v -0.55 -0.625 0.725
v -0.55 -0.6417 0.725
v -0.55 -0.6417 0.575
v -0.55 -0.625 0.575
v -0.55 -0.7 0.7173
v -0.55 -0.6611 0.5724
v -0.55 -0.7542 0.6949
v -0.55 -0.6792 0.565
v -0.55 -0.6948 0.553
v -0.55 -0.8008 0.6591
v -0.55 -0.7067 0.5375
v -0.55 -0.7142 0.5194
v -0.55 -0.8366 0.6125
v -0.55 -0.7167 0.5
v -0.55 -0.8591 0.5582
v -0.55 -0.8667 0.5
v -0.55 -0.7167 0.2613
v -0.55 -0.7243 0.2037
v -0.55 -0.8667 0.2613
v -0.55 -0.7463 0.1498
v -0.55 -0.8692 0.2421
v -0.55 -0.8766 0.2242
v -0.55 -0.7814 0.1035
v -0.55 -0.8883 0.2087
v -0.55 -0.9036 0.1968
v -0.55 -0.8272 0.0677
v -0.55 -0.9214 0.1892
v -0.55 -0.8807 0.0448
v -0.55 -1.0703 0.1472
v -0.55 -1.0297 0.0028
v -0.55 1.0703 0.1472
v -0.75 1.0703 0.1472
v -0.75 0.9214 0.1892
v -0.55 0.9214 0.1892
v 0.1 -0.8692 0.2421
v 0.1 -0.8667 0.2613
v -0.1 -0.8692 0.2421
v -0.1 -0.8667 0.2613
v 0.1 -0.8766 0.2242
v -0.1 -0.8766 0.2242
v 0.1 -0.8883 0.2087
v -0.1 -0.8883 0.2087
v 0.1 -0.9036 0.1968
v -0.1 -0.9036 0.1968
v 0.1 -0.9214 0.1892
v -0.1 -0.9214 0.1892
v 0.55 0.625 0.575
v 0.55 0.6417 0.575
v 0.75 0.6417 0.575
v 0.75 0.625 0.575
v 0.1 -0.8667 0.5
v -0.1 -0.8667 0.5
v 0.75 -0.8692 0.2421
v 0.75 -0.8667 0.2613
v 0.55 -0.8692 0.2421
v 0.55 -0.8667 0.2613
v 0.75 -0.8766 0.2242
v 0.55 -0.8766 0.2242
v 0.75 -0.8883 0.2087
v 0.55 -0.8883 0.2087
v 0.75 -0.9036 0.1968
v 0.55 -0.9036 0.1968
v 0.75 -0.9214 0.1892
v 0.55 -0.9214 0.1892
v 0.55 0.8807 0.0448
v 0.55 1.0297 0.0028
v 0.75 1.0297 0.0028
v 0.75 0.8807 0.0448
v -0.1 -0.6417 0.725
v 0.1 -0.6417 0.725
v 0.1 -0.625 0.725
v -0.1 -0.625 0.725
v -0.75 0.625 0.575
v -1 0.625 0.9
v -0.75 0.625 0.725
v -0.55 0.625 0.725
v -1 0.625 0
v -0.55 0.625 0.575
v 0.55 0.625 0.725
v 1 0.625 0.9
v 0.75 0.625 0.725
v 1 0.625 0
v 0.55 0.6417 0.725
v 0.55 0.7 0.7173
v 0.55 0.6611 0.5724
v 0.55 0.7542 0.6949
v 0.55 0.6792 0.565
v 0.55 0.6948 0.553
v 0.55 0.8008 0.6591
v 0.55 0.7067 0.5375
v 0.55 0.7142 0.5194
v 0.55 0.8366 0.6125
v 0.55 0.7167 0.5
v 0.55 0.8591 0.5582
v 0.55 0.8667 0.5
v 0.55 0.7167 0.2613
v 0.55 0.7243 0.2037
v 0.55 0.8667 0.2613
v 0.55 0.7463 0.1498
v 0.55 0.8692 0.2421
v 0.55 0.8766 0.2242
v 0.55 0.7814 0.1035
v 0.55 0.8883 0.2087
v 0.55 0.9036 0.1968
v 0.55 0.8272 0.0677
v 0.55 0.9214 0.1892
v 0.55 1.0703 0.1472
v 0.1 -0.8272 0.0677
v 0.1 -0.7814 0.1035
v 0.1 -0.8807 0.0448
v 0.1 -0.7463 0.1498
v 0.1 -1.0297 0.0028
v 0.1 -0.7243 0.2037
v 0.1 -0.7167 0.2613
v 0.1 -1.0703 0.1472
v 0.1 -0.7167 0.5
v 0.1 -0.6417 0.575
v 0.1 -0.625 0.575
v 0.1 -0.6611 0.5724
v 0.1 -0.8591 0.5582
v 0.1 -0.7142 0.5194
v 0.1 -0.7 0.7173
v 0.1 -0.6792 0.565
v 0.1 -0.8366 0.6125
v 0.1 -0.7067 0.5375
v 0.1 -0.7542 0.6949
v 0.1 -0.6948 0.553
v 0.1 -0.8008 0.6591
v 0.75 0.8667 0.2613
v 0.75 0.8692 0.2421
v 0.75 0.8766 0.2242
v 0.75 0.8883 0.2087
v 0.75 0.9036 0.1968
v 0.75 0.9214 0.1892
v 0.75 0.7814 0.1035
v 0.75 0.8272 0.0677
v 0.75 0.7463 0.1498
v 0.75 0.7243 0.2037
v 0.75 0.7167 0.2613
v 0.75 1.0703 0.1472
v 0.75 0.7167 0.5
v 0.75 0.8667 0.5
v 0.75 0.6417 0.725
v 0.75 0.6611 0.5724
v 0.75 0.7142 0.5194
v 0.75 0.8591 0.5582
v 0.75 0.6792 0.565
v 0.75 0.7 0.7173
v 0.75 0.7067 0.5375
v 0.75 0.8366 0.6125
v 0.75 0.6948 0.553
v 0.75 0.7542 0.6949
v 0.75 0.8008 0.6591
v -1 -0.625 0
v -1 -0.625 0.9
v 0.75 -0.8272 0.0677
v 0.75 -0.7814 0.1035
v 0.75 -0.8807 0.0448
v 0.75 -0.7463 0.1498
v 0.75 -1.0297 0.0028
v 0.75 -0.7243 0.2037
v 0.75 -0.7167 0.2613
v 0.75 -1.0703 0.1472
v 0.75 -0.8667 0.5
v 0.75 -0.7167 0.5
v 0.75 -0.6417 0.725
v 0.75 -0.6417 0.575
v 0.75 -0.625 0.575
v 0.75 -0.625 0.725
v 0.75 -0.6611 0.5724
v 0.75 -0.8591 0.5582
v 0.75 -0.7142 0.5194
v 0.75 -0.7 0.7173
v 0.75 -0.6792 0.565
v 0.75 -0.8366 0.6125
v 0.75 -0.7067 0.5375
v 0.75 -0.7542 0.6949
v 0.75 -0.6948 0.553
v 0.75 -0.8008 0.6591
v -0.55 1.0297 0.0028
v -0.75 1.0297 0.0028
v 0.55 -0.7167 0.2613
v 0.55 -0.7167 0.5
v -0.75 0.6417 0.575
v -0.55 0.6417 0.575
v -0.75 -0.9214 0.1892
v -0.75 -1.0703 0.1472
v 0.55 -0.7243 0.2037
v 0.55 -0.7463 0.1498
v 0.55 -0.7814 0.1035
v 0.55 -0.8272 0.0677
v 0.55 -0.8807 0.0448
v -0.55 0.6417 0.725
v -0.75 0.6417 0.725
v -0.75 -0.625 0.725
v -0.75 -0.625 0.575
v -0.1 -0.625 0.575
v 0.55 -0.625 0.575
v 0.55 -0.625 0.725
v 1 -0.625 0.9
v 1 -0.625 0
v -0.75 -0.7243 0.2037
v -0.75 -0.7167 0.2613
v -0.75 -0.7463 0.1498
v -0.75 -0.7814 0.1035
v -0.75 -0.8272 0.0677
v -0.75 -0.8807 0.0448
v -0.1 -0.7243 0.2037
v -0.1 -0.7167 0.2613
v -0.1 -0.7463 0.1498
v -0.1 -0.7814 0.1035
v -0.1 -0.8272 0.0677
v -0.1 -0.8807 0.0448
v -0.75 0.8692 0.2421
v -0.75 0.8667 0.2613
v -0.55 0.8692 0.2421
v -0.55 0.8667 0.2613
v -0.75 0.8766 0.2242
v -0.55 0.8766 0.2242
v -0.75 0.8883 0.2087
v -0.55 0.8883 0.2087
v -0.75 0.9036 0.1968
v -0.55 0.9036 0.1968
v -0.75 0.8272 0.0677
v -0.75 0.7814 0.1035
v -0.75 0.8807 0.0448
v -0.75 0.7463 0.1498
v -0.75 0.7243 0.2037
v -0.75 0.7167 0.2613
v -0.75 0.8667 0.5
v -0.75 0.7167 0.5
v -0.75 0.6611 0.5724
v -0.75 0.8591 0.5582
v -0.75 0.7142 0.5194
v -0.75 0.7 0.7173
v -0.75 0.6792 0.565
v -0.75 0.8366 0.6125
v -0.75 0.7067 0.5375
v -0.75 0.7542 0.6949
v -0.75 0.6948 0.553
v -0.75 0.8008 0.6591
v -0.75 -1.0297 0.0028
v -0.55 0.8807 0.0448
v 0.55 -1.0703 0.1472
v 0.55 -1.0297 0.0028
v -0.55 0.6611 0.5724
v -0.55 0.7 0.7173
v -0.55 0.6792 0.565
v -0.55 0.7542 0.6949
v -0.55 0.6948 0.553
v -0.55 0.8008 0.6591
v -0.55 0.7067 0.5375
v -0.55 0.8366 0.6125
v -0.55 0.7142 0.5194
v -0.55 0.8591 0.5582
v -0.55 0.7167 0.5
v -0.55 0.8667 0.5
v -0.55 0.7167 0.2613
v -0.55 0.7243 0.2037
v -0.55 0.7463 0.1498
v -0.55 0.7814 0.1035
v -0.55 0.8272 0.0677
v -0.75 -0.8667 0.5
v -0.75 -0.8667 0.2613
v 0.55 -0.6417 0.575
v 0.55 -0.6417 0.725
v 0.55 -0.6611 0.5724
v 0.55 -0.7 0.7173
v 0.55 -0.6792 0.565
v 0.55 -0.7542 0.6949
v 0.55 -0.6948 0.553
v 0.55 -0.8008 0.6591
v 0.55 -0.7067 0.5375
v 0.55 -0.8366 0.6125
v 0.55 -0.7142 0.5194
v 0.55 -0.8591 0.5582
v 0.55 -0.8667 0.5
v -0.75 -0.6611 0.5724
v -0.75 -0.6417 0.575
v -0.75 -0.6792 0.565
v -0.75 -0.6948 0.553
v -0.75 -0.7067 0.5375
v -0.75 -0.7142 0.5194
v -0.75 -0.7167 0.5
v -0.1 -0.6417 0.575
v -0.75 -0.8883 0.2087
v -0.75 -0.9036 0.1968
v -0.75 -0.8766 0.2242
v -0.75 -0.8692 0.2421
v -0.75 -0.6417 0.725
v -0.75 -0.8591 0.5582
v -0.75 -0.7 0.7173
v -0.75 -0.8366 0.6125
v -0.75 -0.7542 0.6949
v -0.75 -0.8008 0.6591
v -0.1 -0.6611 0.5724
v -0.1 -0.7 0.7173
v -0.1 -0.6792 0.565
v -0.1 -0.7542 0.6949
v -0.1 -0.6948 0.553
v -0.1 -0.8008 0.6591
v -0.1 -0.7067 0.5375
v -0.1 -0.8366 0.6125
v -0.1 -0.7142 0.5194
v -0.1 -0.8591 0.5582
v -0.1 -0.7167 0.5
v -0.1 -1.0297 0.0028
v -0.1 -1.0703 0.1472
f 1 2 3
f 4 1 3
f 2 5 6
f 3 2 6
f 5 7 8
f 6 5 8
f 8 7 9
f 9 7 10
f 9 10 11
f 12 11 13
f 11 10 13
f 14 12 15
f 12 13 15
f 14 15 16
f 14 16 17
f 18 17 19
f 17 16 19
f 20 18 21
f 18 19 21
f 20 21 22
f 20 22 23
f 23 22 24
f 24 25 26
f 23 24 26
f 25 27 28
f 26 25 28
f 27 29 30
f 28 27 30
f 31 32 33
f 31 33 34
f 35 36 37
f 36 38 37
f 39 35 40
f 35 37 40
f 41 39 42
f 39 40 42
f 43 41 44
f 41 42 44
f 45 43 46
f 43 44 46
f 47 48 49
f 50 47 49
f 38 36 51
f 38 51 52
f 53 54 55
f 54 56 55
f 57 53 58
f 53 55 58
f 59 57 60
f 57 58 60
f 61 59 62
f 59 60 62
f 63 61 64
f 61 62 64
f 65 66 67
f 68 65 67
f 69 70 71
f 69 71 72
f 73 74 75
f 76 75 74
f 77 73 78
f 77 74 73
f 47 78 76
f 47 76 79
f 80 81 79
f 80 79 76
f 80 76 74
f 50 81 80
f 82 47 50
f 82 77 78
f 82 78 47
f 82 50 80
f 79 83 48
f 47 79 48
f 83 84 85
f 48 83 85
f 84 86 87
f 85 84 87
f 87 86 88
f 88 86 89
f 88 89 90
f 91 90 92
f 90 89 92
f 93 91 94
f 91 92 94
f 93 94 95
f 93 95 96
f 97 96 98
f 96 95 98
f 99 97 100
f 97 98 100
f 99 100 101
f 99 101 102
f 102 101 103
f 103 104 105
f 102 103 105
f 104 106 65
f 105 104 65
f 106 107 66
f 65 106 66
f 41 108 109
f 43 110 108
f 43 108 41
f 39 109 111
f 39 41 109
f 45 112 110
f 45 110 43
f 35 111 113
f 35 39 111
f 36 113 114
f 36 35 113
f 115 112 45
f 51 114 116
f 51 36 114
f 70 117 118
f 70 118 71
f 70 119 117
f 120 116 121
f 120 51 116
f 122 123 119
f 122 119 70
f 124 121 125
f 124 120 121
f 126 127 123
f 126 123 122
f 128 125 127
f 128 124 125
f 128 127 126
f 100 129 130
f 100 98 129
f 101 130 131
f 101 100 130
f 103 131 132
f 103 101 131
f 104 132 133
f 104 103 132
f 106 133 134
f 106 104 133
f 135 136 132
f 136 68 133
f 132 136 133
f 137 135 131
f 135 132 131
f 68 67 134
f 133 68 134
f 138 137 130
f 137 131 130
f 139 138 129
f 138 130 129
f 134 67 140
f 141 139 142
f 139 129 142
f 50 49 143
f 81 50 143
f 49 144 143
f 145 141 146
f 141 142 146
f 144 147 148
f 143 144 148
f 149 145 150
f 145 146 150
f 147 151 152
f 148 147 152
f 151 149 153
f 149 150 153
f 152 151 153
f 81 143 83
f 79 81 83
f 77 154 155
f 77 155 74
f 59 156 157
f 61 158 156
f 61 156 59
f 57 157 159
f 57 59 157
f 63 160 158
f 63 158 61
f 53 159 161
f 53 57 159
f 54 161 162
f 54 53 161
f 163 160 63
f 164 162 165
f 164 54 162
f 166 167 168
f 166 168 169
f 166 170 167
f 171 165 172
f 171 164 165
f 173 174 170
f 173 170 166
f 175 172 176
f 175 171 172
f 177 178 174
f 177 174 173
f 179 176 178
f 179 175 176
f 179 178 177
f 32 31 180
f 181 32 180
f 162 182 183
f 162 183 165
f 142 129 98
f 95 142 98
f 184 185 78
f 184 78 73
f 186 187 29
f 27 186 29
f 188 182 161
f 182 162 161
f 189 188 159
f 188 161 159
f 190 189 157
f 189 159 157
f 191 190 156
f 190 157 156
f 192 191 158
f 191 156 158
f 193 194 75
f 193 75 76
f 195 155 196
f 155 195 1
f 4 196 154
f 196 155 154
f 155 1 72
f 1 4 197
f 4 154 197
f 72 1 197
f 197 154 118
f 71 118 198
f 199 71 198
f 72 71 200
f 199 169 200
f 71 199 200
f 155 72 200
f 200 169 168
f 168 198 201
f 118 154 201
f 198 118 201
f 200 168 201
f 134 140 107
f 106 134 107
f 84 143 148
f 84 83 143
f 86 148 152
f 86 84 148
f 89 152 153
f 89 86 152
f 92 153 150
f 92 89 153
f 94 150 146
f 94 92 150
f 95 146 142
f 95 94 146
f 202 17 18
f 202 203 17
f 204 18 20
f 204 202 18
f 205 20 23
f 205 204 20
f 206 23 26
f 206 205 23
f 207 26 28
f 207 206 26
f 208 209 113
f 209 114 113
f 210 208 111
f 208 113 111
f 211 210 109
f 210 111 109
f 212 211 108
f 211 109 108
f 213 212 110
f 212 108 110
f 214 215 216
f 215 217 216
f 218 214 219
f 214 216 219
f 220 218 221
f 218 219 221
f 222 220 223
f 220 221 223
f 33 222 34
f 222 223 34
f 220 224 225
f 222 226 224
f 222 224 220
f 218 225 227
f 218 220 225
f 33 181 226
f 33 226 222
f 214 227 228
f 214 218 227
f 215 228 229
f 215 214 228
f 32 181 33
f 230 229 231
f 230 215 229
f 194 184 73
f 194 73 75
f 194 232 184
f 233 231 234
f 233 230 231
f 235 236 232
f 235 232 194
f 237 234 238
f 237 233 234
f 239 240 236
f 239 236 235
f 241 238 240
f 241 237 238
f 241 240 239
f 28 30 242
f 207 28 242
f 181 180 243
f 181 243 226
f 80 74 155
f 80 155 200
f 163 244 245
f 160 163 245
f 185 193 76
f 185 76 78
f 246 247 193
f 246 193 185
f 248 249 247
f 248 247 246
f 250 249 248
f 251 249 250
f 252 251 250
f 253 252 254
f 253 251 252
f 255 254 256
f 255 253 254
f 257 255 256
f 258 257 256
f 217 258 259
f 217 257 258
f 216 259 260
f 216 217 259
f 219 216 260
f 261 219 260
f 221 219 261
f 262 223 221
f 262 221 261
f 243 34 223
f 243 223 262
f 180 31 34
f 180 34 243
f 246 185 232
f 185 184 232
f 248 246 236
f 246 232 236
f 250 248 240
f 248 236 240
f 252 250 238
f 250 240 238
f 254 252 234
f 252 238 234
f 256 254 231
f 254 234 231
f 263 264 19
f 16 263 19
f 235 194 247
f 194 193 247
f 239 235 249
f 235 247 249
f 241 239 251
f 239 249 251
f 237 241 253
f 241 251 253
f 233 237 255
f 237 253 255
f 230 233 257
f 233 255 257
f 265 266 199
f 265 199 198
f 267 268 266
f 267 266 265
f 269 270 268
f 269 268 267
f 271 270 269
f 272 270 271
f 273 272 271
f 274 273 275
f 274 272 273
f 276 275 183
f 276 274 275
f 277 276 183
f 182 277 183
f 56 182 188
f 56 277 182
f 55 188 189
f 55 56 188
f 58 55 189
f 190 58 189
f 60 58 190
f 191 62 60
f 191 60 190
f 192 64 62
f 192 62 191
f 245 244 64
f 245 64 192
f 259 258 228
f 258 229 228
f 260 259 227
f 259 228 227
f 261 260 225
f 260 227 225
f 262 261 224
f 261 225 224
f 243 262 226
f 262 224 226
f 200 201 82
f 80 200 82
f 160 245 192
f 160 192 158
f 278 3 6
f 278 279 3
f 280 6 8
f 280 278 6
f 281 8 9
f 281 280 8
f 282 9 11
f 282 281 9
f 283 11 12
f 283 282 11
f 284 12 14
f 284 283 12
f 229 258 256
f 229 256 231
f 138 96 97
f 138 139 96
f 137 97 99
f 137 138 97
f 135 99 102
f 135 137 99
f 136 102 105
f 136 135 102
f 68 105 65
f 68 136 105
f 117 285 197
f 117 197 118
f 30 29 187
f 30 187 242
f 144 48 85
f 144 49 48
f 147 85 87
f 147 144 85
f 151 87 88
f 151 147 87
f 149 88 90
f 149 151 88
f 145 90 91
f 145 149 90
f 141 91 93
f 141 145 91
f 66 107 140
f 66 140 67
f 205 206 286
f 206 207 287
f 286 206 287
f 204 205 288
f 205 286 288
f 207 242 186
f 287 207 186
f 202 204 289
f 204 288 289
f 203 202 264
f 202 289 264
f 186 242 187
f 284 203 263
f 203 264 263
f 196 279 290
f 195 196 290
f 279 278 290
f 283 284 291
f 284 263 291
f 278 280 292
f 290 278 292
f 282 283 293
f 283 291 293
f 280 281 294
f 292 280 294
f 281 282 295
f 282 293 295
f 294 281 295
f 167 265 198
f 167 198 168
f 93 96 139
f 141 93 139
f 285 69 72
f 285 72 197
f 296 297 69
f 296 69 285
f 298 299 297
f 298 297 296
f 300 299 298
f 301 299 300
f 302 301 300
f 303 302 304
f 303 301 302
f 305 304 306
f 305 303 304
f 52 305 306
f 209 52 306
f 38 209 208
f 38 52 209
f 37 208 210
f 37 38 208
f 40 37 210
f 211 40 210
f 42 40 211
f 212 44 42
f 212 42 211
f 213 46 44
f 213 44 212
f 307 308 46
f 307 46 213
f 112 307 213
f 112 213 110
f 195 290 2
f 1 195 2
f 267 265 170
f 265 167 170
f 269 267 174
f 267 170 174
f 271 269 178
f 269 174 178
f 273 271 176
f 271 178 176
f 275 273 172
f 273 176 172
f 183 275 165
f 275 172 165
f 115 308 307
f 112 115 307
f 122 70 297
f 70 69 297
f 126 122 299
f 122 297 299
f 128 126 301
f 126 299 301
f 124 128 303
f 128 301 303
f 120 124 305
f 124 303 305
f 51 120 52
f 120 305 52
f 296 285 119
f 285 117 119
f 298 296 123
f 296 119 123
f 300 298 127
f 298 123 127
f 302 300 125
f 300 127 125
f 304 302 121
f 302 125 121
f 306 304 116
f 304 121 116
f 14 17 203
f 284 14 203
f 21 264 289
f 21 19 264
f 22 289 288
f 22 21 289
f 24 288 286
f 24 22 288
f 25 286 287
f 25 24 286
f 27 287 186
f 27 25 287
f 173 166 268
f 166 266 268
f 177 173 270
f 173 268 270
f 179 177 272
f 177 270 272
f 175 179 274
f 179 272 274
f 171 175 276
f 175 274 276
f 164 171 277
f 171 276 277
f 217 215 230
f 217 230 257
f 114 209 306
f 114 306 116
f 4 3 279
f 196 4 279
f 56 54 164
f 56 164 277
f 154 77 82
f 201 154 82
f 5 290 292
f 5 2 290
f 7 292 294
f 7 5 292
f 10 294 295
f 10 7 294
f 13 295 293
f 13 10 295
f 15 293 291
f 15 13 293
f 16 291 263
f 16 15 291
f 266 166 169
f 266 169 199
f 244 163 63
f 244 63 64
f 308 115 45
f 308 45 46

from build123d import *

# Parameters (mm, degrees)
F0_W     = 2
F0_H     = 1.25
F1_DEPTH = 0.9
F4_W     = 0.2
F4_H     = 0.15


with BuildPart() as f1:
    # F0 (on Top) → F1 (new body)
    with BuildSketch(Plane.XY):
        Rectangle(F0_W, F0_H)
    extrude(amount=F1_DEPTH)



with BuildPart() as f5:
    # F5: sweep along a path in F2
    with BuildLine(Plane.YZ) as f5_path:
        Line((-0.4733253435, 0.65), (-0.6417372497, 0.65))
        ThreePointArc((-0.6417372497, 0.65), (-0.7478032669, 0.6060660172), (-0.7917372497, 0.5))
        Line((-0.7917372497, 0.5), (-0.7917372497, 0.2613451546))
        ThreePointArc((-0.7917372497, 0.2613451546), (-0.8221502731, 0.1707970733), (-0.90105665, 0.1169668709))
        Line((-0.90105665, 0.1169668709), (-1.05, 0.075))
    # F4 (on line) → F5 (sweep)
    with BuildSketch(Plane.XZ.offset(0.4733253435)):
        with Locations((0, 0.65)):
            Rectangle(F4_W, F4_H)
    sweep(path=f5_path.line)


with BuildPart() as f6_1:
    # F6: copy of F5
    add(f5.part.moved(Location((0.65, 0, 0))))


with BuildPart() as f7_1:
    # F7: instance of F6_1
    add(f6_1.part.mirror(Plane.YZ))


with BuildPart() as f1_1:
    add(f1.part)

    add(f5.part)  # F8 merges F5

    add(f6_1.part)  # F8 merges F6_1

    add(f7_1.part)  # F8 merges F7_1
    # F8: F7_1, F6_1 across plane
    add(f7_1.part.mirror(Plane.XZ))
    add(f6_1.part.mirror(Plane.XZ))


solid = f1_1.part
